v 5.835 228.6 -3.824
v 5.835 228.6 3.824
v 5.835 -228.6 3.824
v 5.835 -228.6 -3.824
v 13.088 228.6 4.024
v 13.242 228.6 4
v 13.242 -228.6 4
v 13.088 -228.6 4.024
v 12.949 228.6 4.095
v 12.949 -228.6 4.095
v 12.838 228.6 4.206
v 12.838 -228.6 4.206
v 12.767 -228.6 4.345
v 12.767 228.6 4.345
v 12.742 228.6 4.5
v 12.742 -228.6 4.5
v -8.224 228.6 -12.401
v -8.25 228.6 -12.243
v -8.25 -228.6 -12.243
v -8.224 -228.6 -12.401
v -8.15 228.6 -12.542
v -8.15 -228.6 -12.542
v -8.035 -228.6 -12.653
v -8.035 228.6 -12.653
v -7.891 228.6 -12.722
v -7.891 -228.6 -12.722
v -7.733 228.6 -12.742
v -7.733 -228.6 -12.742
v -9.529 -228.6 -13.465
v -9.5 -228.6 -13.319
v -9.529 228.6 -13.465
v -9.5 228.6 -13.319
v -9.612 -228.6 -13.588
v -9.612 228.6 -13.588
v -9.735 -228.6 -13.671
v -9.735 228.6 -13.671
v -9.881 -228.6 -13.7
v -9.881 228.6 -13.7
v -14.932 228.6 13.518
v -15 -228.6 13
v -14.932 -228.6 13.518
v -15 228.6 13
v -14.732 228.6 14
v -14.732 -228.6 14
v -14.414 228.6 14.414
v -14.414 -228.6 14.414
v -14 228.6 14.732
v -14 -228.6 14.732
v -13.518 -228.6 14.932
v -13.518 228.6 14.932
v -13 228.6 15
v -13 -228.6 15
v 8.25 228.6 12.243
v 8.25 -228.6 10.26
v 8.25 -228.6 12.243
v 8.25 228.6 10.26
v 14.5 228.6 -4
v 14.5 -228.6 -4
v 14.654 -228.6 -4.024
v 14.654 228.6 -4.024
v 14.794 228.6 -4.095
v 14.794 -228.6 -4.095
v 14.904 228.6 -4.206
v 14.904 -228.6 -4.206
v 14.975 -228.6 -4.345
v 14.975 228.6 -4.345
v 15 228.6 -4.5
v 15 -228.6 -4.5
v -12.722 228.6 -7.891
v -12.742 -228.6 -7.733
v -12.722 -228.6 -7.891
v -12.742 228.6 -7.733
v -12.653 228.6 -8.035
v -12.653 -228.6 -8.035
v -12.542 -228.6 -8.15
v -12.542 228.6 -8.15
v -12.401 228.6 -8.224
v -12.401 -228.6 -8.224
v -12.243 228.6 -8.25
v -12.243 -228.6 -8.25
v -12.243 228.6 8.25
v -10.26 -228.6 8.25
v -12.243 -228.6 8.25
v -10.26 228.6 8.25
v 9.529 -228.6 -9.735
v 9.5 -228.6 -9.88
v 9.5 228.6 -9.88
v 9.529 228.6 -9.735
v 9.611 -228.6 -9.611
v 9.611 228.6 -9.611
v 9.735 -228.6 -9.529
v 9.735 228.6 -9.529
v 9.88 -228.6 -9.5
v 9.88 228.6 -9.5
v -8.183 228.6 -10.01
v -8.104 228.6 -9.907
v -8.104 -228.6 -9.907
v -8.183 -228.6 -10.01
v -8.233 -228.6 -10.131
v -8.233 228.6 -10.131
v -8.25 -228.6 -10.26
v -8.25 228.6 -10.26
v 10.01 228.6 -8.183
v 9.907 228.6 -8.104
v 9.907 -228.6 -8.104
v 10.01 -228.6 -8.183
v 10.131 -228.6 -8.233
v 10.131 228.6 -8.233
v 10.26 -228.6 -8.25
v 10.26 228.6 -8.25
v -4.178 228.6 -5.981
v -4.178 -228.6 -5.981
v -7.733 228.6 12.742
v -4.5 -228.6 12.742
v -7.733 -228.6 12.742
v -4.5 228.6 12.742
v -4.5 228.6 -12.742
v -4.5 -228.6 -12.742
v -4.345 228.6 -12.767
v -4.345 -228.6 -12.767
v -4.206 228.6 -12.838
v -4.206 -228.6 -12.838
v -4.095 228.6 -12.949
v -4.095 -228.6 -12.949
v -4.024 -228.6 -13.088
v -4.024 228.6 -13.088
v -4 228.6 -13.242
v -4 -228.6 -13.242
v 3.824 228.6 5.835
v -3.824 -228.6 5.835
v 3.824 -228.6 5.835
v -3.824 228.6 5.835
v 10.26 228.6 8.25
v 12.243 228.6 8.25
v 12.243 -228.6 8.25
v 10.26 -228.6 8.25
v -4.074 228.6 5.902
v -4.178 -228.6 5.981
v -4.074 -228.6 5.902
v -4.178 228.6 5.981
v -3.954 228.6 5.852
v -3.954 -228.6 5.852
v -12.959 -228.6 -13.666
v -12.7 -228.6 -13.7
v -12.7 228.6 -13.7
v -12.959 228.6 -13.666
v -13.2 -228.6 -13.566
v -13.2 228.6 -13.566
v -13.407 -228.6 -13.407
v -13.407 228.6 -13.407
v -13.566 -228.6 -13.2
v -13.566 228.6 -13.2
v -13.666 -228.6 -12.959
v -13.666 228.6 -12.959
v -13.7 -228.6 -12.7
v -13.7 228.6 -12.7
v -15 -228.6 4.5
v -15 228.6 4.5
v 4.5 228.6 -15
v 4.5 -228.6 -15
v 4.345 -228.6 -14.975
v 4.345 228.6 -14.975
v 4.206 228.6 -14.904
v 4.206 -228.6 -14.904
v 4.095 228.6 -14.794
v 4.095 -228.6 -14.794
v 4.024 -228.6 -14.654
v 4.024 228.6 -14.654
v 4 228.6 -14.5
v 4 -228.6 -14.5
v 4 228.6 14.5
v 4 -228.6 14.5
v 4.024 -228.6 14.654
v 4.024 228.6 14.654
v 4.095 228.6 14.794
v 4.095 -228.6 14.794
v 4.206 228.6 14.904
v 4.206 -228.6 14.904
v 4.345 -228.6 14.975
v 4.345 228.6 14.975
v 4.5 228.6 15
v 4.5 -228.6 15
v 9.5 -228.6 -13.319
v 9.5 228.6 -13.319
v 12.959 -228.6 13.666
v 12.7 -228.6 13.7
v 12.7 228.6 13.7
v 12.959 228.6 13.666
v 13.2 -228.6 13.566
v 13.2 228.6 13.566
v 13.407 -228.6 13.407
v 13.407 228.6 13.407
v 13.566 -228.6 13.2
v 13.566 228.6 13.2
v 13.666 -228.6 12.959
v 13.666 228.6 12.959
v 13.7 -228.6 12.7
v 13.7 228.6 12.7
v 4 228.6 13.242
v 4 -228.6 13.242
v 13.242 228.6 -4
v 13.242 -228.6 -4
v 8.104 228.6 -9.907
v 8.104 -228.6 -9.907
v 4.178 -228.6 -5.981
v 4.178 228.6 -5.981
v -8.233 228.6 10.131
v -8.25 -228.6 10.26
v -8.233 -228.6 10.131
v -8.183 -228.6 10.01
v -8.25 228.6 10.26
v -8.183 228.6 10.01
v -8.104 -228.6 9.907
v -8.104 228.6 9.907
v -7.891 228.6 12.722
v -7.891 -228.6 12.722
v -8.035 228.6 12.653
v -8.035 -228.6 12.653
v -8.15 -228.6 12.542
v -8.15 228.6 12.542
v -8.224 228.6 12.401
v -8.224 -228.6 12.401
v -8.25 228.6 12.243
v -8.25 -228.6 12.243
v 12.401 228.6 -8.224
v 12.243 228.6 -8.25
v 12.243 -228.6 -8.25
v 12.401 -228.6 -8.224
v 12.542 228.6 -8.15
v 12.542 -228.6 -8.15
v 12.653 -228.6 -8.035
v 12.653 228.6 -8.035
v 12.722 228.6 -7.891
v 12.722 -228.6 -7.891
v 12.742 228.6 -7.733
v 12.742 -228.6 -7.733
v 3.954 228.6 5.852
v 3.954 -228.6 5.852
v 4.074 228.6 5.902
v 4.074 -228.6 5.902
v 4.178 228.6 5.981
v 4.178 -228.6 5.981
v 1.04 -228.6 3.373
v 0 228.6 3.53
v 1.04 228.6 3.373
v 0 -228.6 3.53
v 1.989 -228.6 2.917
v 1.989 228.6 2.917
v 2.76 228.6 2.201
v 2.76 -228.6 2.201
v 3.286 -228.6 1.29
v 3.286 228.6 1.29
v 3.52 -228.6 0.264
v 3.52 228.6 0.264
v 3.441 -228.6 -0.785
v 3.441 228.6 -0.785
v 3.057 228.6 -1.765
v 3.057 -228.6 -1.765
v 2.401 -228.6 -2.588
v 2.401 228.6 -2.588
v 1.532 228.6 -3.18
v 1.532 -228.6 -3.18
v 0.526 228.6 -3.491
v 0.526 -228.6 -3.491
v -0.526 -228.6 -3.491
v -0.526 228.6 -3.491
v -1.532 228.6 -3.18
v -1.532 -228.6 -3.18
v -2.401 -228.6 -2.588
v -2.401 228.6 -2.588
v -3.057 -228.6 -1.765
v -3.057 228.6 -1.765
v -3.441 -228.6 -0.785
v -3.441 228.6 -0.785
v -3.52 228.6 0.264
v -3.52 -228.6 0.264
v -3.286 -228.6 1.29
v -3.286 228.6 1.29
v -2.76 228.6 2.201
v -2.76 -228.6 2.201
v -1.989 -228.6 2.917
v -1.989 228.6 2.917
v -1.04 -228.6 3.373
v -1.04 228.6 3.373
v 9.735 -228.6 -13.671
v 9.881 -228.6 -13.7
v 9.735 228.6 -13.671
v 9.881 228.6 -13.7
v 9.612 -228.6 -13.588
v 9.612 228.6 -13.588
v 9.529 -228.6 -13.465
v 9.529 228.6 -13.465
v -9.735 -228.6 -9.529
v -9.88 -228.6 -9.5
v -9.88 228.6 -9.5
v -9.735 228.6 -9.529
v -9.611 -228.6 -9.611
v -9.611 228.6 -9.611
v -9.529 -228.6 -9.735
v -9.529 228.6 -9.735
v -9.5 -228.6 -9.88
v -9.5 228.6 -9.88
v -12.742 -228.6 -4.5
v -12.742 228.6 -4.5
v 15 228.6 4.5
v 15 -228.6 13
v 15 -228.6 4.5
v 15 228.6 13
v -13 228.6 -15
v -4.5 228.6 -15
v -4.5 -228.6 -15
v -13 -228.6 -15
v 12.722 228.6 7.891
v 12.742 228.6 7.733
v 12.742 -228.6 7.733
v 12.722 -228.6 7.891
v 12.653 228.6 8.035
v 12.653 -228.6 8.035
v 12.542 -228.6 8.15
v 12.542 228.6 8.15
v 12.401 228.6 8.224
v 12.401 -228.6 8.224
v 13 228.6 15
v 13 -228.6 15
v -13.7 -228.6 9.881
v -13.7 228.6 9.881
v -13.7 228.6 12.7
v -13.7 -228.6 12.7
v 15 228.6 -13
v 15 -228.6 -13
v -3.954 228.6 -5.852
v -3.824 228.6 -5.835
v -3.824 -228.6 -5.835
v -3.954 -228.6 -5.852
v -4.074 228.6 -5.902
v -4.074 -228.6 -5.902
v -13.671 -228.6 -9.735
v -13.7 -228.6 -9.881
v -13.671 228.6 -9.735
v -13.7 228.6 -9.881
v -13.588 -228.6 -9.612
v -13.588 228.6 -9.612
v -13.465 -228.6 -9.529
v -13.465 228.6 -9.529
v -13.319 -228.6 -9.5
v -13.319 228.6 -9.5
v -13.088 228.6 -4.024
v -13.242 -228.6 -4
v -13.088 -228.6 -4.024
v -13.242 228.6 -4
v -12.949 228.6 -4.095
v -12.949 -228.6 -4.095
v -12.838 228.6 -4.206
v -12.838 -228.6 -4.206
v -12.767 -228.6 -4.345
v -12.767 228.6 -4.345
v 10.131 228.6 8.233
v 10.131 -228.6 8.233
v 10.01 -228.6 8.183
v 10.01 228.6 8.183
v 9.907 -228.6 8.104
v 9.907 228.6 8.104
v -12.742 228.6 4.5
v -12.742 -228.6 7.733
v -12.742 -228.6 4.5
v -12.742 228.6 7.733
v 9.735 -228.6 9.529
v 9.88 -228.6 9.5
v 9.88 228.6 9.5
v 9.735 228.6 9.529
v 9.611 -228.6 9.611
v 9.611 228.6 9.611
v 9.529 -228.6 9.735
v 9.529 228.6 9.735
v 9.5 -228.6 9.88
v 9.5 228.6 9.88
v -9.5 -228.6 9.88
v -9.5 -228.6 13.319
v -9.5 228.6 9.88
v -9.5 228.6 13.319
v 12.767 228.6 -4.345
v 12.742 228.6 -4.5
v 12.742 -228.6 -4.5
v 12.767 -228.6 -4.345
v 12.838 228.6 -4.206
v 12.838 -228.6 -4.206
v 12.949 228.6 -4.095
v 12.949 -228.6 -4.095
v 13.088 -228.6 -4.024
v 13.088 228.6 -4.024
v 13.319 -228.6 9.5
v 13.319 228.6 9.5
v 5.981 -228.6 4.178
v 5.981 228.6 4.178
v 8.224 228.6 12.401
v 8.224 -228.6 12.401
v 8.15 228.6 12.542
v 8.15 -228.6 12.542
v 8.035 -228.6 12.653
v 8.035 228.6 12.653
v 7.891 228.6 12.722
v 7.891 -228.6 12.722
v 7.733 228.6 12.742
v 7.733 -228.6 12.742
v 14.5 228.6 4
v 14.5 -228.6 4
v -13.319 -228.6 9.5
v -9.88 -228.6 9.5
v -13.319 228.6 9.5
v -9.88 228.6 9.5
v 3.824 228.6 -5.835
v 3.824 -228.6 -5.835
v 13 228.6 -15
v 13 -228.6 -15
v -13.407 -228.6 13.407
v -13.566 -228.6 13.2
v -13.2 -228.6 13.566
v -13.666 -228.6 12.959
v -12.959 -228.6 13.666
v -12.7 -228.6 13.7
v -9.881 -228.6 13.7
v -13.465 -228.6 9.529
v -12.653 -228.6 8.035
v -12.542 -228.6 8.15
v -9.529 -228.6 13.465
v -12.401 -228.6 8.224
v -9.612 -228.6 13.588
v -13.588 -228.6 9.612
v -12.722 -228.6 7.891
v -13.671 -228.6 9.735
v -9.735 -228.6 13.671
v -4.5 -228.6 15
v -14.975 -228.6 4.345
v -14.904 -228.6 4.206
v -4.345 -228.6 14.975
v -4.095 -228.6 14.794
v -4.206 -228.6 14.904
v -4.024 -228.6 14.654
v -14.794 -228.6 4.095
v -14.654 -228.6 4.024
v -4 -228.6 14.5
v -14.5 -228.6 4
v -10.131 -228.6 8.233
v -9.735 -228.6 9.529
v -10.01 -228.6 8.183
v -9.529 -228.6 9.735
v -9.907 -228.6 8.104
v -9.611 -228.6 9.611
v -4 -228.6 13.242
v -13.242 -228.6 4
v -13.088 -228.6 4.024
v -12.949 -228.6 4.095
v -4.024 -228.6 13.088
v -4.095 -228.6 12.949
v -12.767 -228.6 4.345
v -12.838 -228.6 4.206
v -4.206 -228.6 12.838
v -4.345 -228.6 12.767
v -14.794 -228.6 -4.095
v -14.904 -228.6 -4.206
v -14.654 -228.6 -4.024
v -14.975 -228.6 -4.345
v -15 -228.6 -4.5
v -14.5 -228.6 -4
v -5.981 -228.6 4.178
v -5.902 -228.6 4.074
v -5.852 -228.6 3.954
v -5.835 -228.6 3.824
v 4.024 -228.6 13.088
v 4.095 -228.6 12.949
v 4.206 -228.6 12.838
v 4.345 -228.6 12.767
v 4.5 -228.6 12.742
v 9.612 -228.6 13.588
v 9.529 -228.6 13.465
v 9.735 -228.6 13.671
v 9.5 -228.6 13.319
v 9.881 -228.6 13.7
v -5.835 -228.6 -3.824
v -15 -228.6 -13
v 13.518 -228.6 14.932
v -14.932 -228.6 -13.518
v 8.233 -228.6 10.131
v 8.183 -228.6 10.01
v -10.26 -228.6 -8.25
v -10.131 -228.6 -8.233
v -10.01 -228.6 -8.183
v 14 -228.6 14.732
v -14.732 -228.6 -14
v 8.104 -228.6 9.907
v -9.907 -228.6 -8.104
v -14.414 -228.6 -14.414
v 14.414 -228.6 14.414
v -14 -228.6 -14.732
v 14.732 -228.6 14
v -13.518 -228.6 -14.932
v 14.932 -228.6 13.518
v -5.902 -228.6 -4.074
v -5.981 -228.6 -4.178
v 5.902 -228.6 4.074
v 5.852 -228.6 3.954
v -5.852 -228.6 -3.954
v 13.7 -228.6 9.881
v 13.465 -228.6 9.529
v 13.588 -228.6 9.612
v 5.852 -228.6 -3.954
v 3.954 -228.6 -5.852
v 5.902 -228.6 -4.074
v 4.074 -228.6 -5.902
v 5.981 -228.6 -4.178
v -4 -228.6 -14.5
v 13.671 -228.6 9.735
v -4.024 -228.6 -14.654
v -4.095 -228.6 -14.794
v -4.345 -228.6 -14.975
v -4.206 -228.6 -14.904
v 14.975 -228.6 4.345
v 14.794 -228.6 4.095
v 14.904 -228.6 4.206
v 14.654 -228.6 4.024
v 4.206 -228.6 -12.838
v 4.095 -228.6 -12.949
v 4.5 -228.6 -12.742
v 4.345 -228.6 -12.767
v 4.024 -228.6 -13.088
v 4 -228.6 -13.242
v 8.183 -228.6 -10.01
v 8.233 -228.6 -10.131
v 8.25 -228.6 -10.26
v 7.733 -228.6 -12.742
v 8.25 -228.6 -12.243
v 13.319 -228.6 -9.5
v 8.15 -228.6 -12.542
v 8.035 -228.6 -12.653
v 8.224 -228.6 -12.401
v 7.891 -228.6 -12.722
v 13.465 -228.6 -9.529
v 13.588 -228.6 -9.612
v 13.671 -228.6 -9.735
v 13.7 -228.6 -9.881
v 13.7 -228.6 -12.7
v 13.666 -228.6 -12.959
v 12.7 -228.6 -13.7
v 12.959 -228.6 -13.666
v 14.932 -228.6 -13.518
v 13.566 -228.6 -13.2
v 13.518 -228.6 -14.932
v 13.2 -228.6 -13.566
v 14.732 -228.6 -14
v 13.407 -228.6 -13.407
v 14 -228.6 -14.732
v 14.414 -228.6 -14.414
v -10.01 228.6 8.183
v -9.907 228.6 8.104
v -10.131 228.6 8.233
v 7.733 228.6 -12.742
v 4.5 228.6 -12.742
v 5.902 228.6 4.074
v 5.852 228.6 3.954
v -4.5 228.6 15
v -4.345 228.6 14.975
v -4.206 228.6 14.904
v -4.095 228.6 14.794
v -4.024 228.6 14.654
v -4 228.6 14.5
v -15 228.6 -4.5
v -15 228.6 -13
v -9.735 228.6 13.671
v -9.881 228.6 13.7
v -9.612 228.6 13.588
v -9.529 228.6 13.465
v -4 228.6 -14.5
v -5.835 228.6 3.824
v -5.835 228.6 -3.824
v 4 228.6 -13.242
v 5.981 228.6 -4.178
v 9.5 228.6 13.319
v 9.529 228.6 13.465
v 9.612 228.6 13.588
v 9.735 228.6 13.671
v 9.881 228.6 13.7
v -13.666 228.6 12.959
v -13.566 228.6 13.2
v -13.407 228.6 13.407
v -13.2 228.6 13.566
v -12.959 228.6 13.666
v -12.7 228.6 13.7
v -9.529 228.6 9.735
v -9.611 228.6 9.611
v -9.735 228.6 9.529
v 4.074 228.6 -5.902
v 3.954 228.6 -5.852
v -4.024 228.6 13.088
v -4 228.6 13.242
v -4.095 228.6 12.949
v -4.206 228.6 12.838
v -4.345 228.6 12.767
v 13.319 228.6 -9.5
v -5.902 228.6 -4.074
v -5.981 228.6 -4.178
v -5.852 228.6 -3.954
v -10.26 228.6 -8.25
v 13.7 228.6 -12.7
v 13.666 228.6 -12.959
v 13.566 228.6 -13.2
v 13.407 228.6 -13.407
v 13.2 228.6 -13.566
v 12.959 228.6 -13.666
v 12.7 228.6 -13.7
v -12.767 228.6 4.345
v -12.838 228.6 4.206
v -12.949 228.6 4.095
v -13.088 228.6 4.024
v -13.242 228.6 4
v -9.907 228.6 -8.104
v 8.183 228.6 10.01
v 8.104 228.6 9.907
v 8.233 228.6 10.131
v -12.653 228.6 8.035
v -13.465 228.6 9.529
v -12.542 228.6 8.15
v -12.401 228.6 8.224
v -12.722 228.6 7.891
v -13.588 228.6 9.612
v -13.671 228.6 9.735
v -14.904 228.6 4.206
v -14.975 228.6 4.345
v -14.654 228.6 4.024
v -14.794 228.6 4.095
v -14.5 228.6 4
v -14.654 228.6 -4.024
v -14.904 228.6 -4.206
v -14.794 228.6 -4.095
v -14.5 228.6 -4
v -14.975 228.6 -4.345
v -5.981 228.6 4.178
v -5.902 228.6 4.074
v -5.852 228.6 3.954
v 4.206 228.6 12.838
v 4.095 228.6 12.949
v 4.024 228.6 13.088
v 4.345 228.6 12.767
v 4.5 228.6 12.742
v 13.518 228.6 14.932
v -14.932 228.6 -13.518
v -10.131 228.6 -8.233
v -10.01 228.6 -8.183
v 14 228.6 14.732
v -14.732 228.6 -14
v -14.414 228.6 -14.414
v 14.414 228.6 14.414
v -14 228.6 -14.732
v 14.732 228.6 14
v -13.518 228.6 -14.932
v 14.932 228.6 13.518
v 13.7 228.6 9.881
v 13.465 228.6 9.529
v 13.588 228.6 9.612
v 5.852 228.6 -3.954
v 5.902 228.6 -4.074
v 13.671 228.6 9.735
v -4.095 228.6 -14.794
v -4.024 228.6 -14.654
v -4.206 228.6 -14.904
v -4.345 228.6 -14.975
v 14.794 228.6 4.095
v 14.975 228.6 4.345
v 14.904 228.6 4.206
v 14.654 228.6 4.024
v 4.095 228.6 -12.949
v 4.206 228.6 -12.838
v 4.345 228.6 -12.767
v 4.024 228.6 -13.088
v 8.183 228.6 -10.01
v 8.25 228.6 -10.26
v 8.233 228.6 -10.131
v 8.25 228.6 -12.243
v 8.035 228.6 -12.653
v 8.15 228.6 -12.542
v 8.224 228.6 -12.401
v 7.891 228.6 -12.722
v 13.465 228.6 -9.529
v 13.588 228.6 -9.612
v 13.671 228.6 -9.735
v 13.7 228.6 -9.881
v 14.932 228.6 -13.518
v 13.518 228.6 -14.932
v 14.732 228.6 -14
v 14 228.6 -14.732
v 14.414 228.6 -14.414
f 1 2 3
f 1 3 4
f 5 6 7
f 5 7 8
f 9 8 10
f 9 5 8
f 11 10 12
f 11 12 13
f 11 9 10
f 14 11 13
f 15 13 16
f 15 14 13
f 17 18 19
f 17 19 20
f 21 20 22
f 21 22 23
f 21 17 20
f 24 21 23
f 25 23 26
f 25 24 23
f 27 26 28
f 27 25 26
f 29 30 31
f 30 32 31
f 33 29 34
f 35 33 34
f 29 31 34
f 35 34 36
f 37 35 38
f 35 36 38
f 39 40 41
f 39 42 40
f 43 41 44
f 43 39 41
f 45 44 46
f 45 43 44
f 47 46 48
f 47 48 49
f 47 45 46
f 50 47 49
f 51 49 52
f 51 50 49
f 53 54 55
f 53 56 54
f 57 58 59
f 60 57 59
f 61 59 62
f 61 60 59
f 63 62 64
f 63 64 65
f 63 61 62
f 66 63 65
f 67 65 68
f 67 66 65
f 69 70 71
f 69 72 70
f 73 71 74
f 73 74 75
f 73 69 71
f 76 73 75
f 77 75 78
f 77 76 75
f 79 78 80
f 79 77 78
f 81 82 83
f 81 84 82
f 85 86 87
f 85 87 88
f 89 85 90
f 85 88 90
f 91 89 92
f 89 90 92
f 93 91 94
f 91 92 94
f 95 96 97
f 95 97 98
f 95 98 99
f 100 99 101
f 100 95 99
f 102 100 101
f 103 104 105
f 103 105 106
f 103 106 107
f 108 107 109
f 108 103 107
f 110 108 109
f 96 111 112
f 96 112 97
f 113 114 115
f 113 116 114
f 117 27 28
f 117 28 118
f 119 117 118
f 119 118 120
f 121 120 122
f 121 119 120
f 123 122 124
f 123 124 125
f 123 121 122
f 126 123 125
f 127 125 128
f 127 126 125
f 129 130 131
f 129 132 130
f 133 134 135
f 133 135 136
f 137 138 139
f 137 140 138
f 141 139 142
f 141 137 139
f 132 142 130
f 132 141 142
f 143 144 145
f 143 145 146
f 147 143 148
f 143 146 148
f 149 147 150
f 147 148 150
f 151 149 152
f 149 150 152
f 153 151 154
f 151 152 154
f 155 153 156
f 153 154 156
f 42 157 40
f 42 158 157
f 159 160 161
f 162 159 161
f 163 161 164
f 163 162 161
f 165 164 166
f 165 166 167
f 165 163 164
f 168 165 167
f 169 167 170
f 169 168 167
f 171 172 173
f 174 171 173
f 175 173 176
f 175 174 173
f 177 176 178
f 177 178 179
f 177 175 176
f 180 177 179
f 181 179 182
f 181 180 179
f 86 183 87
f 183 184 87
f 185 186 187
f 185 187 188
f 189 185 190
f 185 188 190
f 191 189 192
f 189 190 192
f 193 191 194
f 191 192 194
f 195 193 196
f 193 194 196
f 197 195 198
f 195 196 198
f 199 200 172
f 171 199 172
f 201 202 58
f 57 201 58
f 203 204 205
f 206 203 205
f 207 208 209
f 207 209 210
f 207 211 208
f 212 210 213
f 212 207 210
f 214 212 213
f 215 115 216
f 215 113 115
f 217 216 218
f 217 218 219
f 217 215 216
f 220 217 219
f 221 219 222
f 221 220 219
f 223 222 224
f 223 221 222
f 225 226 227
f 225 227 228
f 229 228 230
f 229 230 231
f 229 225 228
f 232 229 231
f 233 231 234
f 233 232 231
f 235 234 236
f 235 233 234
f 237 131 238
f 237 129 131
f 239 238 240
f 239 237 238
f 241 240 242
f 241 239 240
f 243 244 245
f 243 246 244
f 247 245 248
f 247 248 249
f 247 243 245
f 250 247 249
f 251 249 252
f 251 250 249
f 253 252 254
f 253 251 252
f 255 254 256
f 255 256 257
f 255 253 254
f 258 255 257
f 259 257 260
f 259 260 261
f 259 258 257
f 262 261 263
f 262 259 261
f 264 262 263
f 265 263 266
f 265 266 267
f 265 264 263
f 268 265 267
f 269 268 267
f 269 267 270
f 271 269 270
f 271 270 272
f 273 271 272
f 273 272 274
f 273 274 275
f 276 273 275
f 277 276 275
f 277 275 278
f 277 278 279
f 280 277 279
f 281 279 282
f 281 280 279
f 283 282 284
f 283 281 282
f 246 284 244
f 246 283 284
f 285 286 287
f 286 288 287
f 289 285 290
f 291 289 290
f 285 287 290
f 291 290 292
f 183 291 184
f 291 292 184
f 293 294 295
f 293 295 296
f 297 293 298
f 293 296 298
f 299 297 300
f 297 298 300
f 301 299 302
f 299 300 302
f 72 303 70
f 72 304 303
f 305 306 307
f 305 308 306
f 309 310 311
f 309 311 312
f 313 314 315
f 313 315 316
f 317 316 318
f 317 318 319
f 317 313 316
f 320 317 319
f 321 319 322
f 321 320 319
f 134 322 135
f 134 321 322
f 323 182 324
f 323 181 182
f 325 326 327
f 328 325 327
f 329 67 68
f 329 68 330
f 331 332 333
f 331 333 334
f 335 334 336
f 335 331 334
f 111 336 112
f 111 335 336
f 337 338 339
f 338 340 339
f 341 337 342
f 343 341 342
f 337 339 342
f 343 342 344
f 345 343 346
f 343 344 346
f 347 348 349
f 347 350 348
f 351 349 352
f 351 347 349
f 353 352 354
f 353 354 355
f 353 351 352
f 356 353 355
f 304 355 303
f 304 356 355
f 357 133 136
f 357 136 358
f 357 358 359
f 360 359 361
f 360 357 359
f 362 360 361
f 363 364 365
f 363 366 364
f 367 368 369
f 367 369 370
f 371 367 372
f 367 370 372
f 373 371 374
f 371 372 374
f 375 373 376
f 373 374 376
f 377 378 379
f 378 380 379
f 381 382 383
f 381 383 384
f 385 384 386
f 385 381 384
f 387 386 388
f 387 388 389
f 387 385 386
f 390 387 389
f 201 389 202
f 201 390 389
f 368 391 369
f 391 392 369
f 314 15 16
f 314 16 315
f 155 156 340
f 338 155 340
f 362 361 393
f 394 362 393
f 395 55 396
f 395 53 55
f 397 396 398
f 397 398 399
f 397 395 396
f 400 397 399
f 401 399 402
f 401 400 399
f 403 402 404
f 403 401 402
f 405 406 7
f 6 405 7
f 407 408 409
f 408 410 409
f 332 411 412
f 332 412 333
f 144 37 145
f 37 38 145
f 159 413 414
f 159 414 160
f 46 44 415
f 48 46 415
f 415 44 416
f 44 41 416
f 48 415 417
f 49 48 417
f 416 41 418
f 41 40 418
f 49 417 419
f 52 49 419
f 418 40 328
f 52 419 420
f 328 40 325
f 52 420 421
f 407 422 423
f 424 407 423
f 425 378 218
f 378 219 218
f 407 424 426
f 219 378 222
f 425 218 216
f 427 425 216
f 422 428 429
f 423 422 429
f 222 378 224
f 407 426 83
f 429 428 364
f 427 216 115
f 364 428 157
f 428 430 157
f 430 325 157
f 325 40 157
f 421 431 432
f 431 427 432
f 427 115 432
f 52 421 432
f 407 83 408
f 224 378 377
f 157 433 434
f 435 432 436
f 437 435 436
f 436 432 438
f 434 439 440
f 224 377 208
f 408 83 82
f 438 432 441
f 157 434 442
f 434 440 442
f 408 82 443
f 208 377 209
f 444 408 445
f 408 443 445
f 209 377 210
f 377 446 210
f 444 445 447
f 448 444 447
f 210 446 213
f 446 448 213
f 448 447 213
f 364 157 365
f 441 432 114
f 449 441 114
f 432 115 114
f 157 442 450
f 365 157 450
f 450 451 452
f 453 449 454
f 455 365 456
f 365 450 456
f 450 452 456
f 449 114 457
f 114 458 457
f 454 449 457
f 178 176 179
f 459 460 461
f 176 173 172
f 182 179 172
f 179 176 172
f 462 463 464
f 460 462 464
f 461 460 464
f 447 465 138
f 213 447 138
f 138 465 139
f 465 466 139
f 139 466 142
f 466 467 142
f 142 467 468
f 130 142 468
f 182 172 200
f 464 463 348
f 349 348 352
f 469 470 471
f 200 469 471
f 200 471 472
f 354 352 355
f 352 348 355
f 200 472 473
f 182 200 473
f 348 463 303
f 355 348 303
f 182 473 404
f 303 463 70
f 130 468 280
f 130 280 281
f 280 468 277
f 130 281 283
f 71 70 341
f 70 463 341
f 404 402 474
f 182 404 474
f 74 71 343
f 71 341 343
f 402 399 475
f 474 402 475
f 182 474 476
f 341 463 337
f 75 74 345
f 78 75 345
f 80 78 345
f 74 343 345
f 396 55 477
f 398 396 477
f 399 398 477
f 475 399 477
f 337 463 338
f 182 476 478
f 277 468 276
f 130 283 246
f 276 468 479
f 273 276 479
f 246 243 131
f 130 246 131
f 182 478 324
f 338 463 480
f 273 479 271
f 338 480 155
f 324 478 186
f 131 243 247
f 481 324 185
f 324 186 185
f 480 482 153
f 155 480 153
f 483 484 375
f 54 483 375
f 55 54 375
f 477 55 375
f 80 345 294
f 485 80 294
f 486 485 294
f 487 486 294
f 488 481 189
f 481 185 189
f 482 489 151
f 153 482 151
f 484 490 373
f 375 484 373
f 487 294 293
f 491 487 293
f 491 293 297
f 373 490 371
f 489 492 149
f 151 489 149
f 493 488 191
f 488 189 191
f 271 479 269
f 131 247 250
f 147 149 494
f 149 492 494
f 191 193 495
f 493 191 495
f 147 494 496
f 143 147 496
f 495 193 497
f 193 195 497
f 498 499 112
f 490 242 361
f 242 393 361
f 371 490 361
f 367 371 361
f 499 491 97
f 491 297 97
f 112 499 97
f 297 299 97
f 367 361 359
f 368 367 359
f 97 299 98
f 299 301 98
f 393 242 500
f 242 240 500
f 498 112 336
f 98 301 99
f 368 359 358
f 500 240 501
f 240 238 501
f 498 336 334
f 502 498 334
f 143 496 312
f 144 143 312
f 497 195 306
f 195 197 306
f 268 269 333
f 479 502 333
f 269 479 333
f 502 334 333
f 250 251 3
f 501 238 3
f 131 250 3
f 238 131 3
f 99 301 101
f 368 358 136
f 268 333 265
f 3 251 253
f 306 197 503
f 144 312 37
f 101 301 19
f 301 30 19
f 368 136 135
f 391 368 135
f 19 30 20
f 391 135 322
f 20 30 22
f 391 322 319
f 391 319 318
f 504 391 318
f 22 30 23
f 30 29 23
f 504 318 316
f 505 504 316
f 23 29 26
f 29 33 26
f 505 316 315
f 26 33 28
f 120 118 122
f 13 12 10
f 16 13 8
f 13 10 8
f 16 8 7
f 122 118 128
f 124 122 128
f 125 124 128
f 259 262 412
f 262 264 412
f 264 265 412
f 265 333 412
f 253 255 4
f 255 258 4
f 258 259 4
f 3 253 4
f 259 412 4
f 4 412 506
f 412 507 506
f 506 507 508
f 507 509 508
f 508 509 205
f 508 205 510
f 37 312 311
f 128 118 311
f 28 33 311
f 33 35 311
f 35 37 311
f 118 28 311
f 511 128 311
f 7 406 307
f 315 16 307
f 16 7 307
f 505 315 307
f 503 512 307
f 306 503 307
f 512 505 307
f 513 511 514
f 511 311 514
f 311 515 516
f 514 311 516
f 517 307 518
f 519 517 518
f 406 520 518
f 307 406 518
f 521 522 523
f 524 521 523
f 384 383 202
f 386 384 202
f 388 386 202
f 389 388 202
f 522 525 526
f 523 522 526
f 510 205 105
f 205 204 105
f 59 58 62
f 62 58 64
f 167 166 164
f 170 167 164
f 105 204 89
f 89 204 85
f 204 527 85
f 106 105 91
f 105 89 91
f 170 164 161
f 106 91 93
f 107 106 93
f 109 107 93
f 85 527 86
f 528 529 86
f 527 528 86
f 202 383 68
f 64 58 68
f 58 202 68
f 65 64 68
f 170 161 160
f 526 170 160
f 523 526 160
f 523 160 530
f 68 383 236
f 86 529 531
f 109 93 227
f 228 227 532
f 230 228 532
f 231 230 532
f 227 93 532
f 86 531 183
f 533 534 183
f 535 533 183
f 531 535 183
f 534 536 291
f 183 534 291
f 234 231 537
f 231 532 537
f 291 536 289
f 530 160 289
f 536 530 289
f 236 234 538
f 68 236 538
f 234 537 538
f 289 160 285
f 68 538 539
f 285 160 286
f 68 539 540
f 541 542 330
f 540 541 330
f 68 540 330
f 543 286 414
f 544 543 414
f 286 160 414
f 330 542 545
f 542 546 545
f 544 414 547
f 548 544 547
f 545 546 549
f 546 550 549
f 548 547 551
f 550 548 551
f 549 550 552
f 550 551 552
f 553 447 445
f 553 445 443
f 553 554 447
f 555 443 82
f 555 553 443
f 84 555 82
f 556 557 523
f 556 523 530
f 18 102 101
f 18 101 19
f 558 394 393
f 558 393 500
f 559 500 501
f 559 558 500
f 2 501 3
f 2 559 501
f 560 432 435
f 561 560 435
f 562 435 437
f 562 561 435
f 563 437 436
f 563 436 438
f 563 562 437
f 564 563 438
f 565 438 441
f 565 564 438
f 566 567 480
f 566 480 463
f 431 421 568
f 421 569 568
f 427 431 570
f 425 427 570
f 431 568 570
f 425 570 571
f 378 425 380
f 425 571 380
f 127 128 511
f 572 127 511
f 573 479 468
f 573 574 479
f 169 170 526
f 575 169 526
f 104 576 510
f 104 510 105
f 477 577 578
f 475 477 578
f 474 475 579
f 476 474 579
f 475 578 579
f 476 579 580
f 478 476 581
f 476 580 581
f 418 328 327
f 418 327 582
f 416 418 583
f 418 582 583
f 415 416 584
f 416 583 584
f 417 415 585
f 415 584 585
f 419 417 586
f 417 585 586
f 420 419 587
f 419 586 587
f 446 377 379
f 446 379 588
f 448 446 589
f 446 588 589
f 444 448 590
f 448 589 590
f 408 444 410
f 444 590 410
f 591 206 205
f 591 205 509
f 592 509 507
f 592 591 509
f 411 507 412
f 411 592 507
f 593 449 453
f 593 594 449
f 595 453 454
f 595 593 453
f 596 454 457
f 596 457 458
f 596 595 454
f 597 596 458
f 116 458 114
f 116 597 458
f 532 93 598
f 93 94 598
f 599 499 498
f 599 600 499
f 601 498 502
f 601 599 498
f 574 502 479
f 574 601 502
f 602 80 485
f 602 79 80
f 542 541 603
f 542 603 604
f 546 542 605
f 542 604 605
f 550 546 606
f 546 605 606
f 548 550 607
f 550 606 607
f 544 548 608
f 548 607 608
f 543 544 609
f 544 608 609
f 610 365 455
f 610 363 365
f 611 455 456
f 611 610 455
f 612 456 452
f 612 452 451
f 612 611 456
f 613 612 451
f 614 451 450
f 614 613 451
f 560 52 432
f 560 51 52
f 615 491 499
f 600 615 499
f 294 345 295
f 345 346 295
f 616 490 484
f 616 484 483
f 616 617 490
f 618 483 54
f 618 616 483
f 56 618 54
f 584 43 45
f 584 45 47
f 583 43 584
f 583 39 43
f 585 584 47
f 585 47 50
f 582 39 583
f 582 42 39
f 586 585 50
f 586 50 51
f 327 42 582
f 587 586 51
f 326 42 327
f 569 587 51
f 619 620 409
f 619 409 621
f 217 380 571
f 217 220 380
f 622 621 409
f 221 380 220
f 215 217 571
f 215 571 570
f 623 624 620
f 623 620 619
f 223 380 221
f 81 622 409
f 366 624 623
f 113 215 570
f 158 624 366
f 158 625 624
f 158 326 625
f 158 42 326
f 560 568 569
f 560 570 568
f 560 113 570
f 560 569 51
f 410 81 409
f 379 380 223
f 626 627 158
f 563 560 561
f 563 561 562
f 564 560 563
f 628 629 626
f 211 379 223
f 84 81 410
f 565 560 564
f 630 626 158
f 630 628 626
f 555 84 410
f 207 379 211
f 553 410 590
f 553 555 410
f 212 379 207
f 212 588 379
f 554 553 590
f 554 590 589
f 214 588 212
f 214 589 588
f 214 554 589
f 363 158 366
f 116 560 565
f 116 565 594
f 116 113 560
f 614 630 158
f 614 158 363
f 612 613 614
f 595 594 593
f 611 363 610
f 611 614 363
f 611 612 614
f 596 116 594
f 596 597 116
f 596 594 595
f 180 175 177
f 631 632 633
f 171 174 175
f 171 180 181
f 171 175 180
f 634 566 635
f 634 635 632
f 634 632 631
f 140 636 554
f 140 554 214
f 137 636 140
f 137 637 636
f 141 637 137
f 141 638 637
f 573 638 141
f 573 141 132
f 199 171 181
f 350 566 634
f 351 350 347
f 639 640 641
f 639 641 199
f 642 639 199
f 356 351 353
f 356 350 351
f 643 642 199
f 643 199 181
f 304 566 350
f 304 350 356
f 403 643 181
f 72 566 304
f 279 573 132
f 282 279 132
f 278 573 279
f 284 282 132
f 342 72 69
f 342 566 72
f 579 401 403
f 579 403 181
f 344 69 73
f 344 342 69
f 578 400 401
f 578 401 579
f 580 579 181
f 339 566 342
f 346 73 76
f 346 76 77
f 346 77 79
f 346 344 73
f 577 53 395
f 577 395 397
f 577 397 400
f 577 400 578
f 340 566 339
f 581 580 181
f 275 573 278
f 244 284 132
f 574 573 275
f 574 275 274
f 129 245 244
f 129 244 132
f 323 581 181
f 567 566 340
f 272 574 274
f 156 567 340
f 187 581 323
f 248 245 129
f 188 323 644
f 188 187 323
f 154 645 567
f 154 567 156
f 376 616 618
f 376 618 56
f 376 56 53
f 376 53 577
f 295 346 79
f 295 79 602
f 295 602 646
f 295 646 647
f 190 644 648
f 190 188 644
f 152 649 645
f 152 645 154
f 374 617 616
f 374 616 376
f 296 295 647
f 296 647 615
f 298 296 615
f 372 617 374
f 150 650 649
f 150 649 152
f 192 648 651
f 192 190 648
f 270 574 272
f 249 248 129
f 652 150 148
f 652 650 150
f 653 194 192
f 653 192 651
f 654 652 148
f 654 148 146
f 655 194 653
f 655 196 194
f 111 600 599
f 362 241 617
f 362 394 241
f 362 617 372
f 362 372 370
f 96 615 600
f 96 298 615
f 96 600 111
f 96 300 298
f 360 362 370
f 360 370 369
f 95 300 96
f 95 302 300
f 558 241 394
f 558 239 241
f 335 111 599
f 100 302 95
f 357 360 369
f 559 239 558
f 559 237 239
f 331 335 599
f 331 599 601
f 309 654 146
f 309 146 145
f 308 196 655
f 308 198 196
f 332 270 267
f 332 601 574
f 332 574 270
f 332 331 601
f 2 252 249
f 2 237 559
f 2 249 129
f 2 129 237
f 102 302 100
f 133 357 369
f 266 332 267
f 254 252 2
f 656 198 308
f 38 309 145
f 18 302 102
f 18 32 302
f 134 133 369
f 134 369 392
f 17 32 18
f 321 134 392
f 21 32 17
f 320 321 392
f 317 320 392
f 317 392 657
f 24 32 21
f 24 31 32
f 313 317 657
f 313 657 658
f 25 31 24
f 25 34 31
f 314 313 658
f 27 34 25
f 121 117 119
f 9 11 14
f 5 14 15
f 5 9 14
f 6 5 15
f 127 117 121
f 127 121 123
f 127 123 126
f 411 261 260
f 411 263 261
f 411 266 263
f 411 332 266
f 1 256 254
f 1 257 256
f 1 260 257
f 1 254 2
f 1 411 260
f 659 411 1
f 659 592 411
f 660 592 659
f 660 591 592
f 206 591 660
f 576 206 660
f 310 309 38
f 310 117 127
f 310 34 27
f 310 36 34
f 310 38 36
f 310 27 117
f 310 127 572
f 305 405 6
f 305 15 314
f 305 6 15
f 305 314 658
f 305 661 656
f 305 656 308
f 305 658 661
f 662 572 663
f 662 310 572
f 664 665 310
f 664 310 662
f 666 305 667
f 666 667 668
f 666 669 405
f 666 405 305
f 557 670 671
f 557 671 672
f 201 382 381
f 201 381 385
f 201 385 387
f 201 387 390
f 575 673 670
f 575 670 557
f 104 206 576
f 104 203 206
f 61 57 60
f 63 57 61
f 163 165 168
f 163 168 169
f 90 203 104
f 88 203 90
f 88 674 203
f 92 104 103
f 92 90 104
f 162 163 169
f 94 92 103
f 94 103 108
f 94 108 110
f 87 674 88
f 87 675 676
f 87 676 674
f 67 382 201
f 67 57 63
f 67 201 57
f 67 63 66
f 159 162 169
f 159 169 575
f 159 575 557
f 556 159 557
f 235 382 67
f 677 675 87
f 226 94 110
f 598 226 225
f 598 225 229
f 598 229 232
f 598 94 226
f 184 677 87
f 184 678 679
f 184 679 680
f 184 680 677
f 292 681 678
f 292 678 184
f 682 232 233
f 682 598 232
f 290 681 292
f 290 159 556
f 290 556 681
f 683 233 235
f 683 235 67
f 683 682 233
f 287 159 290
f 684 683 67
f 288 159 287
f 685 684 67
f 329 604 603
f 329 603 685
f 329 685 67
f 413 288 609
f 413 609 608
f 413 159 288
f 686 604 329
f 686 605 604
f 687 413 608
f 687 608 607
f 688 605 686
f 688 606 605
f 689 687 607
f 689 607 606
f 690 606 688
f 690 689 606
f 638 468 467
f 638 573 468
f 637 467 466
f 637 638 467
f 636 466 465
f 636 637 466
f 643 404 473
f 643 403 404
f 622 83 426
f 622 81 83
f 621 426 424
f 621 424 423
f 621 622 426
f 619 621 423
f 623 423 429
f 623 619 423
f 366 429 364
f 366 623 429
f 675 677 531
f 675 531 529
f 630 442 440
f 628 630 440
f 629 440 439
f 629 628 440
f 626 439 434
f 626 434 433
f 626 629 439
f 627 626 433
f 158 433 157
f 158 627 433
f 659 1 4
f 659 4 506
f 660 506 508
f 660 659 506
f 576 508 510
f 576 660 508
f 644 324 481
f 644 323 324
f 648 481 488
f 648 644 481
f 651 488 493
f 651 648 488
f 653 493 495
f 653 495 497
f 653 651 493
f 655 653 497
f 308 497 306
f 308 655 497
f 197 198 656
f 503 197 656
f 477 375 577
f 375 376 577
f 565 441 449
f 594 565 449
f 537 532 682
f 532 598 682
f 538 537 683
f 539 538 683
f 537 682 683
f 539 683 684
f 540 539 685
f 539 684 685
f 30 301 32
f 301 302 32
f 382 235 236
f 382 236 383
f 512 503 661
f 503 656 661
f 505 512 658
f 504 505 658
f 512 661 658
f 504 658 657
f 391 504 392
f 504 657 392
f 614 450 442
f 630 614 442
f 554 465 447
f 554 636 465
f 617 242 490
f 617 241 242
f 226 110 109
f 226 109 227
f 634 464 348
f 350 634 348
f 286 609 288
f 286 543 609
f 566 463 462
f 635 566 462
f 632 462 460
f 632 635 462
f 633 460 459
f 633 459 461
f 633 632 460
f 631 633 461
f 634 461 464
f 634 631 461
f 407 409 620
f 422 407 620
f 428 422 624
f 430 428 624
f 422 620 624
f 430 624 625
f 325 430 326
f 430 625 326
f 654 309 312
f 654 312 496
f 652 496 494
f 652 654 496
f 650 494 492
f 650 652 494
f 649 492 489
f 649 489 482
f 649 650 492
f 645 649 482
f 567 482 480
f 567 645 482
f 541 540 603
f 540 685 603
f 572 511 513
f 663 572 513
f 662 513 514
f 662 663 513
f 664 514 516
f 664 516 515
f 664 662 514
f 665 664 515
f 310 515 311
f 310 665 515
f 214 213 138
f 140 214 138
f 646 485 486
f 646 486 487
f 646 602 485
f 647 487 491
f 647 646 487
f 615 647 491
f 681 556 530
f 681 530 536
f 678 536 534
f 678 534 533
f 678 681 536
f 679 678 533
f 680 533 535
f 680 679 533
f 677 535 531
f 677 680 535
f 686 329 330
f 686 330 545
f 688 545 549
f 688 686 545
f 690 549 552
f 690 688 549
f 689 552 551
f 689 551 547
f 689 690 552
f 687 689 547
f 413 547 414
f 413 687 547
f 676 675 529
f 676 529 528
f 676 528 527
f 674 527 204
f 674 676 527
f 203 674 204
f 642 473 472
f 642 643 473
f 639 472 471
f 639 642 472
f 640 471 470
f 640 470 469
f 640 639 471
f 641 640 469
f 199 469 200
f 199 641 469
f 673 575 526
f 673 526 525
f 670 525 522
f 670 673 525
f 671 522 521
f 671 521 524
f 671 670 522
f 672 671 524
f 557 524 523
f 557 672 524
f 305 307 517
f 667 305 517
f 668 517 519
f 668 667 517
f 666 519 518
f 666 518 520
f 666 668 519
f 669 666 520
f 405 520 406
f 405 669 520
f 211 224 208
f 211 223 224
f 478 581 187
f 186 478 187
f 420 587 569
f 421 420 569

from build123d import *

# Parameters (mm, degrees)
SKETCH1_R           = 3.52998588
BOSS_EXTRUDE1_DEPTH = 228.6


with BuildPart() as part:
    # Sketch1 → Boss-Extrude1 (new, symmetric)
    with BuildSketch(Plane(origin=(0, 0, 0), x_dir=(1, 0, 0), z_dir=(0, 1, 0))):
        with BuildLine():
            Line((14.49994, -4), (13.24247465, -4))
            ThreePointArc((13.24247465, -4), (12.88892126, -4.146446609), (12.74247465, -4.5))
            Line((12.74247465, -4.5), (12.74247465, -7.732519321))
            ThreePointArc((12.74247465, -7.732519321), (12.602449697, -8.097296796), (12.242781236, -8.249967))
            Line((12.242781236, -8.249967), (10.260188032, -8.249967))
            ThreePointArc((10.260188032, -8.249967), (10.068847082, -8.211906919), (9.906636056, -8.103520976))
            Line((9.906636056, -8.103520976), (5.981117769, -4.178002689))
            ThreePointArc((5.981117769, -4.178002689), (5.872731827, -4.015791664), (5.834671745, -3.824450713))
            Line((5.834671745, -3.824450713), (5.834671745, -1.01249595))
            Line((5.834671745, -1.01249595), (5.834671745, 0.88749645))
            Line((5.834671745, 0.88749645), (5.834671745, 3.824450713))
            ThreePointArc((5.834671745, 3.824450713), (5.872731827, 4.015791664), (5.981117769, 4.178002689))
            Line((5.981117769, 4.178002689), (9.906636056, 8.103520976))
            ThreePointArc((9.906636056, 8.103520976), (10.068847082, 8.211906919), (10.260188032, 8.249967))
            Line((10.260188032, 8.249967), (12.242781236, 8.249967))
            ThreePointArc((12.242781236, 8.249967), (12.602449697, 8.097296796), (12.74247465, 7.732519321))
            Line((12.74247465, 7.732519321), (12.74247465, 4.5))
            ThreePointArc((12.74247465, 4.5), (12.88892126, 4.146446609), (13.24247465, 4))
            Line((13.24247465, 4), (14.49994, 4))
            ThreePointArc((14.49994, 4), (14.853493391, 4.146446609), (14.99994, 4.5))
            Line((14.99994, 4.5), (14.99994, 12.999948))
            ThreePointArc((14.99994, 12.999948), (14.414155906, 14.414155906), (12.999948, 14.99994))
            Line((12.999948, 14.99994), (4.5, 14.99994))
            ThreePointArc((4.5, 14.99994), (4.146446609, 14.853493391), (4, 14.49994))
            Line((4, 14.49994), (4, 13.24247465))
            ThreePointArc((4, 13.24247465), (4.146446609, 12.88892126), (4.5, 12.74247465))
            Line((4.5, 12.74247465), (7.732519321, 12.74247465))
            ThreePointArc((7.732519321, 12.74247465), (8.097296796, 12.602449697), (8.249967, 12.242781236))
            Line((8.249967, 12.242781236), (8.249967, 10.260188032))
            ThreePointArc((8.249967, 10.260188032), (8.211906919, 10.068847082), (8.103520976, 9.906636056))
            Line((8.103520976, 9.906636056), (4.178002689, 5.981117769))
            ThreePointArc((4.178002689, 5.981117769), (4.015791664, 5.872731827), (3.824450713, 5.834671745))
            Line((3.824450713, 5.834671745), (0.9499962, 5.834671745))
            Line((0.9499962, 5.834671745), (-0.9499962, 5.834671745))
            Line((-0.9499962, 5.834671745), (-3.824450713, 5.834671745))
            ThreePointArc((-3.824450713, 5.834671745), (-4.015791664, 5.872731827), (-4.178002689, 5.981117769))
            Line((-4.178002689, 5.981117769), (-8.103520976, 9.906636056))
            ThreePointArc((-8.103520976, 9.906636056), (-8.211906919, 10.068847082), (-8.249967, 10.260188032))
            Line((-8.249967, 10.260188032), (-8.249967, 12.242781236))
            ThreePointArc((-8.249967, 12.242781236), (-8.097296796, 12.602449697), (-7.732519321, 12.74247465))
            Line((-7.732519321, 12.74247465), (-4.5, 12.74247465))
            ThreePointArc((-4.5, 12.74247465), (-4.146446609, 12.88892126), (-4, 13.24247465))
            Line((-4, 13.24247465), (-4, 14.49994))
            ThreePointArc((-4, 14.49994), (-4.146446609, 14.853493391), (-4.5, 14.99994))
            Line((-4.5, 14.99994), (-12.999948, 14.99994))
            ThreePointArc((-12.999948, 14.99994), (-14.414155906, 14.414155906), (-14.99994, 12.999948))
            Line((-14.99994, 12.999948), (-14.99994, 4.5))
            ThreePointArc((-14.99994, 4.5), (-14.853493391, 4.146446609), (-14.49994, 4))
            Line((-14.49994, 4), (-13.24247465, 4))
            ThreePointArc((-13.24247465, 4), (-12.88892126, 4.146446609), (-12.74247465, 4.5))
            Line((-12.74247465, 4.5), (-12.74247465, 7.732519321))
            ThreePointArc((-12.74247465, 7.732519321), (-12.602449697, 8.097296796), (-12.242781236, 8.249967))
            Line((-12.242781236, 8.249967), (-10.260188032, 8.249967))
            ThreePointArc((-10.260188032, 8.249967), (-10.068847082, 8.211906919), (-9.906636056, 8.103520976))
            Line((-9.906636056, 8.103520976), (-5.981117769, 4.178002689))
            ThreePointArc((-5.981117769, 4.178002689), (-5.872731827, 4.015791664), (-5.834671745, 3.824450713))
            Line((-5.834671745, 3.824450713), (-5.834671745, 0.88749645))
            Line((-5.834671745, 0.88749645), (-5.834671745, -1.01249595))
            Line((-5.834671745, -1.01249595), (-5.834671745, -3.824450713))
            ThreePointArc((-5.834671745, -3.824450713), (-5.872731827, -4.015791664), (-5.981117769, -4.178002689))
            Line((-5.981117769, -4.178002689), (-9.906636056, -8.103520976))
            ThreePointArc((-9.906636056, -8.103520976), (-10.068847082, -8.211906919), (-10.260188032, -8.249967))
            Line((-10.260188032, -8.249967), (-12.242781236, -8.249967))
            ThreePointArc((-12.242781236, -8.249967), (-12.602449697, -8.097296796), (-12.74247465, -7.732519321))
            Line((-12.74247465, -7.732519321), (-12.74247465, -4.5))
            ThreePointArc((-12.74247465, -4.5), (-12.88892126, -4.146446609), (-13.24247465, -4))
            Line((-13.24247465, -4), (-14.49994, -4))
            ThreePointArc((-14.49994, -4), (-14.853493391, -4.146446609), (-14.99994, -4.5))
            Line((-14.99994, -4.5), (-14.99994, -12.999948))
            ThreePointArc((-14.99994, -12.999948), (-14.414155906, -14.414155906), (-12.999948, -14.99994))
            Line((-12.999948, -14.99994), (-4.5, -14.99994))
            ThreePointArc((-4.5, -14.99994), (-4.146446609, -14.853493391), (-4, -14.49994))
            Line((-4, -14.49994), (-4, -13.24247465))
            ThreePointArc((-4, -13.24247465), (-4.146446609, -12.88892126), (-4.5, -12.74247465))
            Line((-4.5, -12.74247465), (-7.732519321, -12.74247465))
            ThreePointArc((-7.732519321, -12.74247465), (-8.097296796, -12.602449697), (-8.249967, -12.242781236))
            Line((-8.249967, -12.242781236), (-8.249967, -10.260188032))
            ThreePointArc((-8.249967, -10.260188032), (-8.211906919, -10.068847082), (-8.103520976, -9.906636056))
            Line((-8.103520976, -9.906636056), (-4.178002689, -5.981117769))
            ThreePointArc((-4.178002689, -5.981117769), (-4.015791664, -5.872731827), (-3.824450713, -5.834671745))
            Line((-3.824450713, -5.834671745), (-0.9499962, -5.834671745))
            Line((-0.9499962, -5.834671745), (0.9499962, -5.834671745))
            Line((0.9499962, -5.834671745), (3.824450713, -5.834671745))
            ThreePointArc((3.824450713, -5.834671745), (4.015791664, -5.872731827), (4.178002689, -5.981117769))
            Line((4.178002689, -5.981117769), (8.103520976, -9.906636056))
            ThreePointArc((8.103520976, -9.906636056), (8.211906919, -10.068847082), (8.249967, -10.260188032))
            Line((8.249967, -10.260188032), (8.249967, -12.242781236))
            ThreePointArc((8.249967, -12.242781236), (8.097296796, -12.602449697), (7.732519321, -12.74247465))
            Line((7.732519321, -12.74247465), (4.5, -12.74247465))
            ThreePointArc((4.5, -12.74247465), (4.146446609, -12.88892126), (4, -13.24247465))
            Line((4, -13.24247465), (4, -14.49994))
            ThreePointArc((4, -14.49994), (4.146446609, -14.853493391), (4.5, -14.99994))
            Line((4.5, -14.99994), (12.999948, -14.99994))
            ThreePointArc((12.999948, -14.99994), (14.414155906, -14.414155906), (14.99994, -12.999948))
            Line((14.99994, -12.999948), (14.99994, -4.5))
            ThreePointArc((14.99994, -4.5), (14.853493391, -4.146446609), (14.49994, -4))
        make_face()
        with Locations(Location((0, 0, 0), (0, 0, 270))):
            Circle(SKETCH1_R, mode=Mode.SUBTRACT)
        with BuildLine():
            Line((-12.6999492, -13.6999452), (-9.880960476, -13.6999452))
            ThreePointArc((-9.880960476, -13.6999452), (-9.61155387, -13.58835333), (-9.499962, -13.318946724))
            Line((-9.499962, -13.318946724), (-9.499962, -9.87996048))
            ThreePointArc((-9.499962, -9.87996048), (-9.611260978, -9.611260978), (-9.87996048, -9.499962))
            Line((-9.87996048, -9.499962), (-13.318946724, -9.499962))
            ThreePointArc((-13.318946724, -9.499962), (-13.58835333, -9.61155387), (-13.6999452, -9.880960476))
            Line((-13.6999452, -9.880960476), (-13.6999452, -12.6999492))
            ThreePointArc((-13.6999452, -12.6999492), (-13.407053153, -13.407053153), (-12.6999492, -13.6999452))
        make_face(mode=Mode.SUBTRACT)
        with BuildLine():
            Line((13.6999452, -12.6999492), (13.6999452, -9.880960476))
            ThreePointArc((13.6999452, -9.880960476), (13.58835333, -9.61155387), (13.318946724, -9.499962))
            Line((13.318946724, -9.499962), (9.87996048, -9.499962))
            ThreePointArc((9.87996048, -9.499962), (9.611260978, -9.611260978), (9.499962, -9.87996048))
            Line((9.499962, -9.87996048), (9.499962, -13.318946724))
            ThreePointArc((9.499962, -13.318946724), (9.61155387, -13.58835333), (9.880960476, -13.6999452))
            Line((9.880960476, -13.6999452), (12.6999492, -13.6999452))
            ThreePointArc((12.6999492, -13.6999452), (13.407053153, -13.407053153), (13.6999452, -12.6999492))
        make_face(mode=Mode.SUBTRACT)
        with BuildLine():
            Line((9.87996048, 9.499962), (13.318946724, 9.499962))
            ThreePointArc((13.318946724, 9.499962), (13.58835333, 9.61155387), (13.6999452, 9.880960476))
            Line((13.6999452, 9.880960476), (13.6999452, 12.6999492))
            ThreePointArc((13.6999452, 12.6999492), (13.407053153, 13.407053153), (12.6999492, 13.6999452))
            Line((12.6999492, 13.6999452), (9.880960476, 13.6999452))
            ThreePointArc((9.880960476, 13.6999452), (9.61155387, 13.58835333), (9.499962, 13.318946724))
            Line((9.499962, 13.318946724), (9.499962, 9.87996048))
            ThreePointArc((9.499962, 9.87996048), (9.611260978, 9.611260978), (9.87996048, 9.499962))
        make_face(mode=Mode.SUBTRACT)
        with BuildLine():
            Line((-13.6999452, 12.6999492), (-13.6999452, 9.880960476))
            ThreePointArc((-13.6999452, 9.880960476), (-13.58835333, 9.61155387), (-13.318946724, 9.499962))
            Line((-13.318946724, 9.499962), (-9.87996048, 9.499962))
            ThreePointArc((-9.87996048, 9.499962), (-9.611260978, 9.611260978), (-9.499962, 9.87996048))
            Line((-9.499962, 9.87996048), (-9.499962, 13.318946724))
            ThreePointArc((-9.499962, 13.318946724), (-9.61155387, 13.58835333), (-9.880960476, 13.6999452))
            Line((-9.880960476, 13.6999452), (-12.6999492, 13.6999452))
            ThreePointArc((-12.6999492, 13.6999452), (-13.407053153, 13.407053153), (-13.6999452, 12.6999492))
        make_face(mode=Mode.SUBTRACT)
    extrude(amount=BOSS_EXTRUDE1_DEPTH, both=True)


solid = part.part
